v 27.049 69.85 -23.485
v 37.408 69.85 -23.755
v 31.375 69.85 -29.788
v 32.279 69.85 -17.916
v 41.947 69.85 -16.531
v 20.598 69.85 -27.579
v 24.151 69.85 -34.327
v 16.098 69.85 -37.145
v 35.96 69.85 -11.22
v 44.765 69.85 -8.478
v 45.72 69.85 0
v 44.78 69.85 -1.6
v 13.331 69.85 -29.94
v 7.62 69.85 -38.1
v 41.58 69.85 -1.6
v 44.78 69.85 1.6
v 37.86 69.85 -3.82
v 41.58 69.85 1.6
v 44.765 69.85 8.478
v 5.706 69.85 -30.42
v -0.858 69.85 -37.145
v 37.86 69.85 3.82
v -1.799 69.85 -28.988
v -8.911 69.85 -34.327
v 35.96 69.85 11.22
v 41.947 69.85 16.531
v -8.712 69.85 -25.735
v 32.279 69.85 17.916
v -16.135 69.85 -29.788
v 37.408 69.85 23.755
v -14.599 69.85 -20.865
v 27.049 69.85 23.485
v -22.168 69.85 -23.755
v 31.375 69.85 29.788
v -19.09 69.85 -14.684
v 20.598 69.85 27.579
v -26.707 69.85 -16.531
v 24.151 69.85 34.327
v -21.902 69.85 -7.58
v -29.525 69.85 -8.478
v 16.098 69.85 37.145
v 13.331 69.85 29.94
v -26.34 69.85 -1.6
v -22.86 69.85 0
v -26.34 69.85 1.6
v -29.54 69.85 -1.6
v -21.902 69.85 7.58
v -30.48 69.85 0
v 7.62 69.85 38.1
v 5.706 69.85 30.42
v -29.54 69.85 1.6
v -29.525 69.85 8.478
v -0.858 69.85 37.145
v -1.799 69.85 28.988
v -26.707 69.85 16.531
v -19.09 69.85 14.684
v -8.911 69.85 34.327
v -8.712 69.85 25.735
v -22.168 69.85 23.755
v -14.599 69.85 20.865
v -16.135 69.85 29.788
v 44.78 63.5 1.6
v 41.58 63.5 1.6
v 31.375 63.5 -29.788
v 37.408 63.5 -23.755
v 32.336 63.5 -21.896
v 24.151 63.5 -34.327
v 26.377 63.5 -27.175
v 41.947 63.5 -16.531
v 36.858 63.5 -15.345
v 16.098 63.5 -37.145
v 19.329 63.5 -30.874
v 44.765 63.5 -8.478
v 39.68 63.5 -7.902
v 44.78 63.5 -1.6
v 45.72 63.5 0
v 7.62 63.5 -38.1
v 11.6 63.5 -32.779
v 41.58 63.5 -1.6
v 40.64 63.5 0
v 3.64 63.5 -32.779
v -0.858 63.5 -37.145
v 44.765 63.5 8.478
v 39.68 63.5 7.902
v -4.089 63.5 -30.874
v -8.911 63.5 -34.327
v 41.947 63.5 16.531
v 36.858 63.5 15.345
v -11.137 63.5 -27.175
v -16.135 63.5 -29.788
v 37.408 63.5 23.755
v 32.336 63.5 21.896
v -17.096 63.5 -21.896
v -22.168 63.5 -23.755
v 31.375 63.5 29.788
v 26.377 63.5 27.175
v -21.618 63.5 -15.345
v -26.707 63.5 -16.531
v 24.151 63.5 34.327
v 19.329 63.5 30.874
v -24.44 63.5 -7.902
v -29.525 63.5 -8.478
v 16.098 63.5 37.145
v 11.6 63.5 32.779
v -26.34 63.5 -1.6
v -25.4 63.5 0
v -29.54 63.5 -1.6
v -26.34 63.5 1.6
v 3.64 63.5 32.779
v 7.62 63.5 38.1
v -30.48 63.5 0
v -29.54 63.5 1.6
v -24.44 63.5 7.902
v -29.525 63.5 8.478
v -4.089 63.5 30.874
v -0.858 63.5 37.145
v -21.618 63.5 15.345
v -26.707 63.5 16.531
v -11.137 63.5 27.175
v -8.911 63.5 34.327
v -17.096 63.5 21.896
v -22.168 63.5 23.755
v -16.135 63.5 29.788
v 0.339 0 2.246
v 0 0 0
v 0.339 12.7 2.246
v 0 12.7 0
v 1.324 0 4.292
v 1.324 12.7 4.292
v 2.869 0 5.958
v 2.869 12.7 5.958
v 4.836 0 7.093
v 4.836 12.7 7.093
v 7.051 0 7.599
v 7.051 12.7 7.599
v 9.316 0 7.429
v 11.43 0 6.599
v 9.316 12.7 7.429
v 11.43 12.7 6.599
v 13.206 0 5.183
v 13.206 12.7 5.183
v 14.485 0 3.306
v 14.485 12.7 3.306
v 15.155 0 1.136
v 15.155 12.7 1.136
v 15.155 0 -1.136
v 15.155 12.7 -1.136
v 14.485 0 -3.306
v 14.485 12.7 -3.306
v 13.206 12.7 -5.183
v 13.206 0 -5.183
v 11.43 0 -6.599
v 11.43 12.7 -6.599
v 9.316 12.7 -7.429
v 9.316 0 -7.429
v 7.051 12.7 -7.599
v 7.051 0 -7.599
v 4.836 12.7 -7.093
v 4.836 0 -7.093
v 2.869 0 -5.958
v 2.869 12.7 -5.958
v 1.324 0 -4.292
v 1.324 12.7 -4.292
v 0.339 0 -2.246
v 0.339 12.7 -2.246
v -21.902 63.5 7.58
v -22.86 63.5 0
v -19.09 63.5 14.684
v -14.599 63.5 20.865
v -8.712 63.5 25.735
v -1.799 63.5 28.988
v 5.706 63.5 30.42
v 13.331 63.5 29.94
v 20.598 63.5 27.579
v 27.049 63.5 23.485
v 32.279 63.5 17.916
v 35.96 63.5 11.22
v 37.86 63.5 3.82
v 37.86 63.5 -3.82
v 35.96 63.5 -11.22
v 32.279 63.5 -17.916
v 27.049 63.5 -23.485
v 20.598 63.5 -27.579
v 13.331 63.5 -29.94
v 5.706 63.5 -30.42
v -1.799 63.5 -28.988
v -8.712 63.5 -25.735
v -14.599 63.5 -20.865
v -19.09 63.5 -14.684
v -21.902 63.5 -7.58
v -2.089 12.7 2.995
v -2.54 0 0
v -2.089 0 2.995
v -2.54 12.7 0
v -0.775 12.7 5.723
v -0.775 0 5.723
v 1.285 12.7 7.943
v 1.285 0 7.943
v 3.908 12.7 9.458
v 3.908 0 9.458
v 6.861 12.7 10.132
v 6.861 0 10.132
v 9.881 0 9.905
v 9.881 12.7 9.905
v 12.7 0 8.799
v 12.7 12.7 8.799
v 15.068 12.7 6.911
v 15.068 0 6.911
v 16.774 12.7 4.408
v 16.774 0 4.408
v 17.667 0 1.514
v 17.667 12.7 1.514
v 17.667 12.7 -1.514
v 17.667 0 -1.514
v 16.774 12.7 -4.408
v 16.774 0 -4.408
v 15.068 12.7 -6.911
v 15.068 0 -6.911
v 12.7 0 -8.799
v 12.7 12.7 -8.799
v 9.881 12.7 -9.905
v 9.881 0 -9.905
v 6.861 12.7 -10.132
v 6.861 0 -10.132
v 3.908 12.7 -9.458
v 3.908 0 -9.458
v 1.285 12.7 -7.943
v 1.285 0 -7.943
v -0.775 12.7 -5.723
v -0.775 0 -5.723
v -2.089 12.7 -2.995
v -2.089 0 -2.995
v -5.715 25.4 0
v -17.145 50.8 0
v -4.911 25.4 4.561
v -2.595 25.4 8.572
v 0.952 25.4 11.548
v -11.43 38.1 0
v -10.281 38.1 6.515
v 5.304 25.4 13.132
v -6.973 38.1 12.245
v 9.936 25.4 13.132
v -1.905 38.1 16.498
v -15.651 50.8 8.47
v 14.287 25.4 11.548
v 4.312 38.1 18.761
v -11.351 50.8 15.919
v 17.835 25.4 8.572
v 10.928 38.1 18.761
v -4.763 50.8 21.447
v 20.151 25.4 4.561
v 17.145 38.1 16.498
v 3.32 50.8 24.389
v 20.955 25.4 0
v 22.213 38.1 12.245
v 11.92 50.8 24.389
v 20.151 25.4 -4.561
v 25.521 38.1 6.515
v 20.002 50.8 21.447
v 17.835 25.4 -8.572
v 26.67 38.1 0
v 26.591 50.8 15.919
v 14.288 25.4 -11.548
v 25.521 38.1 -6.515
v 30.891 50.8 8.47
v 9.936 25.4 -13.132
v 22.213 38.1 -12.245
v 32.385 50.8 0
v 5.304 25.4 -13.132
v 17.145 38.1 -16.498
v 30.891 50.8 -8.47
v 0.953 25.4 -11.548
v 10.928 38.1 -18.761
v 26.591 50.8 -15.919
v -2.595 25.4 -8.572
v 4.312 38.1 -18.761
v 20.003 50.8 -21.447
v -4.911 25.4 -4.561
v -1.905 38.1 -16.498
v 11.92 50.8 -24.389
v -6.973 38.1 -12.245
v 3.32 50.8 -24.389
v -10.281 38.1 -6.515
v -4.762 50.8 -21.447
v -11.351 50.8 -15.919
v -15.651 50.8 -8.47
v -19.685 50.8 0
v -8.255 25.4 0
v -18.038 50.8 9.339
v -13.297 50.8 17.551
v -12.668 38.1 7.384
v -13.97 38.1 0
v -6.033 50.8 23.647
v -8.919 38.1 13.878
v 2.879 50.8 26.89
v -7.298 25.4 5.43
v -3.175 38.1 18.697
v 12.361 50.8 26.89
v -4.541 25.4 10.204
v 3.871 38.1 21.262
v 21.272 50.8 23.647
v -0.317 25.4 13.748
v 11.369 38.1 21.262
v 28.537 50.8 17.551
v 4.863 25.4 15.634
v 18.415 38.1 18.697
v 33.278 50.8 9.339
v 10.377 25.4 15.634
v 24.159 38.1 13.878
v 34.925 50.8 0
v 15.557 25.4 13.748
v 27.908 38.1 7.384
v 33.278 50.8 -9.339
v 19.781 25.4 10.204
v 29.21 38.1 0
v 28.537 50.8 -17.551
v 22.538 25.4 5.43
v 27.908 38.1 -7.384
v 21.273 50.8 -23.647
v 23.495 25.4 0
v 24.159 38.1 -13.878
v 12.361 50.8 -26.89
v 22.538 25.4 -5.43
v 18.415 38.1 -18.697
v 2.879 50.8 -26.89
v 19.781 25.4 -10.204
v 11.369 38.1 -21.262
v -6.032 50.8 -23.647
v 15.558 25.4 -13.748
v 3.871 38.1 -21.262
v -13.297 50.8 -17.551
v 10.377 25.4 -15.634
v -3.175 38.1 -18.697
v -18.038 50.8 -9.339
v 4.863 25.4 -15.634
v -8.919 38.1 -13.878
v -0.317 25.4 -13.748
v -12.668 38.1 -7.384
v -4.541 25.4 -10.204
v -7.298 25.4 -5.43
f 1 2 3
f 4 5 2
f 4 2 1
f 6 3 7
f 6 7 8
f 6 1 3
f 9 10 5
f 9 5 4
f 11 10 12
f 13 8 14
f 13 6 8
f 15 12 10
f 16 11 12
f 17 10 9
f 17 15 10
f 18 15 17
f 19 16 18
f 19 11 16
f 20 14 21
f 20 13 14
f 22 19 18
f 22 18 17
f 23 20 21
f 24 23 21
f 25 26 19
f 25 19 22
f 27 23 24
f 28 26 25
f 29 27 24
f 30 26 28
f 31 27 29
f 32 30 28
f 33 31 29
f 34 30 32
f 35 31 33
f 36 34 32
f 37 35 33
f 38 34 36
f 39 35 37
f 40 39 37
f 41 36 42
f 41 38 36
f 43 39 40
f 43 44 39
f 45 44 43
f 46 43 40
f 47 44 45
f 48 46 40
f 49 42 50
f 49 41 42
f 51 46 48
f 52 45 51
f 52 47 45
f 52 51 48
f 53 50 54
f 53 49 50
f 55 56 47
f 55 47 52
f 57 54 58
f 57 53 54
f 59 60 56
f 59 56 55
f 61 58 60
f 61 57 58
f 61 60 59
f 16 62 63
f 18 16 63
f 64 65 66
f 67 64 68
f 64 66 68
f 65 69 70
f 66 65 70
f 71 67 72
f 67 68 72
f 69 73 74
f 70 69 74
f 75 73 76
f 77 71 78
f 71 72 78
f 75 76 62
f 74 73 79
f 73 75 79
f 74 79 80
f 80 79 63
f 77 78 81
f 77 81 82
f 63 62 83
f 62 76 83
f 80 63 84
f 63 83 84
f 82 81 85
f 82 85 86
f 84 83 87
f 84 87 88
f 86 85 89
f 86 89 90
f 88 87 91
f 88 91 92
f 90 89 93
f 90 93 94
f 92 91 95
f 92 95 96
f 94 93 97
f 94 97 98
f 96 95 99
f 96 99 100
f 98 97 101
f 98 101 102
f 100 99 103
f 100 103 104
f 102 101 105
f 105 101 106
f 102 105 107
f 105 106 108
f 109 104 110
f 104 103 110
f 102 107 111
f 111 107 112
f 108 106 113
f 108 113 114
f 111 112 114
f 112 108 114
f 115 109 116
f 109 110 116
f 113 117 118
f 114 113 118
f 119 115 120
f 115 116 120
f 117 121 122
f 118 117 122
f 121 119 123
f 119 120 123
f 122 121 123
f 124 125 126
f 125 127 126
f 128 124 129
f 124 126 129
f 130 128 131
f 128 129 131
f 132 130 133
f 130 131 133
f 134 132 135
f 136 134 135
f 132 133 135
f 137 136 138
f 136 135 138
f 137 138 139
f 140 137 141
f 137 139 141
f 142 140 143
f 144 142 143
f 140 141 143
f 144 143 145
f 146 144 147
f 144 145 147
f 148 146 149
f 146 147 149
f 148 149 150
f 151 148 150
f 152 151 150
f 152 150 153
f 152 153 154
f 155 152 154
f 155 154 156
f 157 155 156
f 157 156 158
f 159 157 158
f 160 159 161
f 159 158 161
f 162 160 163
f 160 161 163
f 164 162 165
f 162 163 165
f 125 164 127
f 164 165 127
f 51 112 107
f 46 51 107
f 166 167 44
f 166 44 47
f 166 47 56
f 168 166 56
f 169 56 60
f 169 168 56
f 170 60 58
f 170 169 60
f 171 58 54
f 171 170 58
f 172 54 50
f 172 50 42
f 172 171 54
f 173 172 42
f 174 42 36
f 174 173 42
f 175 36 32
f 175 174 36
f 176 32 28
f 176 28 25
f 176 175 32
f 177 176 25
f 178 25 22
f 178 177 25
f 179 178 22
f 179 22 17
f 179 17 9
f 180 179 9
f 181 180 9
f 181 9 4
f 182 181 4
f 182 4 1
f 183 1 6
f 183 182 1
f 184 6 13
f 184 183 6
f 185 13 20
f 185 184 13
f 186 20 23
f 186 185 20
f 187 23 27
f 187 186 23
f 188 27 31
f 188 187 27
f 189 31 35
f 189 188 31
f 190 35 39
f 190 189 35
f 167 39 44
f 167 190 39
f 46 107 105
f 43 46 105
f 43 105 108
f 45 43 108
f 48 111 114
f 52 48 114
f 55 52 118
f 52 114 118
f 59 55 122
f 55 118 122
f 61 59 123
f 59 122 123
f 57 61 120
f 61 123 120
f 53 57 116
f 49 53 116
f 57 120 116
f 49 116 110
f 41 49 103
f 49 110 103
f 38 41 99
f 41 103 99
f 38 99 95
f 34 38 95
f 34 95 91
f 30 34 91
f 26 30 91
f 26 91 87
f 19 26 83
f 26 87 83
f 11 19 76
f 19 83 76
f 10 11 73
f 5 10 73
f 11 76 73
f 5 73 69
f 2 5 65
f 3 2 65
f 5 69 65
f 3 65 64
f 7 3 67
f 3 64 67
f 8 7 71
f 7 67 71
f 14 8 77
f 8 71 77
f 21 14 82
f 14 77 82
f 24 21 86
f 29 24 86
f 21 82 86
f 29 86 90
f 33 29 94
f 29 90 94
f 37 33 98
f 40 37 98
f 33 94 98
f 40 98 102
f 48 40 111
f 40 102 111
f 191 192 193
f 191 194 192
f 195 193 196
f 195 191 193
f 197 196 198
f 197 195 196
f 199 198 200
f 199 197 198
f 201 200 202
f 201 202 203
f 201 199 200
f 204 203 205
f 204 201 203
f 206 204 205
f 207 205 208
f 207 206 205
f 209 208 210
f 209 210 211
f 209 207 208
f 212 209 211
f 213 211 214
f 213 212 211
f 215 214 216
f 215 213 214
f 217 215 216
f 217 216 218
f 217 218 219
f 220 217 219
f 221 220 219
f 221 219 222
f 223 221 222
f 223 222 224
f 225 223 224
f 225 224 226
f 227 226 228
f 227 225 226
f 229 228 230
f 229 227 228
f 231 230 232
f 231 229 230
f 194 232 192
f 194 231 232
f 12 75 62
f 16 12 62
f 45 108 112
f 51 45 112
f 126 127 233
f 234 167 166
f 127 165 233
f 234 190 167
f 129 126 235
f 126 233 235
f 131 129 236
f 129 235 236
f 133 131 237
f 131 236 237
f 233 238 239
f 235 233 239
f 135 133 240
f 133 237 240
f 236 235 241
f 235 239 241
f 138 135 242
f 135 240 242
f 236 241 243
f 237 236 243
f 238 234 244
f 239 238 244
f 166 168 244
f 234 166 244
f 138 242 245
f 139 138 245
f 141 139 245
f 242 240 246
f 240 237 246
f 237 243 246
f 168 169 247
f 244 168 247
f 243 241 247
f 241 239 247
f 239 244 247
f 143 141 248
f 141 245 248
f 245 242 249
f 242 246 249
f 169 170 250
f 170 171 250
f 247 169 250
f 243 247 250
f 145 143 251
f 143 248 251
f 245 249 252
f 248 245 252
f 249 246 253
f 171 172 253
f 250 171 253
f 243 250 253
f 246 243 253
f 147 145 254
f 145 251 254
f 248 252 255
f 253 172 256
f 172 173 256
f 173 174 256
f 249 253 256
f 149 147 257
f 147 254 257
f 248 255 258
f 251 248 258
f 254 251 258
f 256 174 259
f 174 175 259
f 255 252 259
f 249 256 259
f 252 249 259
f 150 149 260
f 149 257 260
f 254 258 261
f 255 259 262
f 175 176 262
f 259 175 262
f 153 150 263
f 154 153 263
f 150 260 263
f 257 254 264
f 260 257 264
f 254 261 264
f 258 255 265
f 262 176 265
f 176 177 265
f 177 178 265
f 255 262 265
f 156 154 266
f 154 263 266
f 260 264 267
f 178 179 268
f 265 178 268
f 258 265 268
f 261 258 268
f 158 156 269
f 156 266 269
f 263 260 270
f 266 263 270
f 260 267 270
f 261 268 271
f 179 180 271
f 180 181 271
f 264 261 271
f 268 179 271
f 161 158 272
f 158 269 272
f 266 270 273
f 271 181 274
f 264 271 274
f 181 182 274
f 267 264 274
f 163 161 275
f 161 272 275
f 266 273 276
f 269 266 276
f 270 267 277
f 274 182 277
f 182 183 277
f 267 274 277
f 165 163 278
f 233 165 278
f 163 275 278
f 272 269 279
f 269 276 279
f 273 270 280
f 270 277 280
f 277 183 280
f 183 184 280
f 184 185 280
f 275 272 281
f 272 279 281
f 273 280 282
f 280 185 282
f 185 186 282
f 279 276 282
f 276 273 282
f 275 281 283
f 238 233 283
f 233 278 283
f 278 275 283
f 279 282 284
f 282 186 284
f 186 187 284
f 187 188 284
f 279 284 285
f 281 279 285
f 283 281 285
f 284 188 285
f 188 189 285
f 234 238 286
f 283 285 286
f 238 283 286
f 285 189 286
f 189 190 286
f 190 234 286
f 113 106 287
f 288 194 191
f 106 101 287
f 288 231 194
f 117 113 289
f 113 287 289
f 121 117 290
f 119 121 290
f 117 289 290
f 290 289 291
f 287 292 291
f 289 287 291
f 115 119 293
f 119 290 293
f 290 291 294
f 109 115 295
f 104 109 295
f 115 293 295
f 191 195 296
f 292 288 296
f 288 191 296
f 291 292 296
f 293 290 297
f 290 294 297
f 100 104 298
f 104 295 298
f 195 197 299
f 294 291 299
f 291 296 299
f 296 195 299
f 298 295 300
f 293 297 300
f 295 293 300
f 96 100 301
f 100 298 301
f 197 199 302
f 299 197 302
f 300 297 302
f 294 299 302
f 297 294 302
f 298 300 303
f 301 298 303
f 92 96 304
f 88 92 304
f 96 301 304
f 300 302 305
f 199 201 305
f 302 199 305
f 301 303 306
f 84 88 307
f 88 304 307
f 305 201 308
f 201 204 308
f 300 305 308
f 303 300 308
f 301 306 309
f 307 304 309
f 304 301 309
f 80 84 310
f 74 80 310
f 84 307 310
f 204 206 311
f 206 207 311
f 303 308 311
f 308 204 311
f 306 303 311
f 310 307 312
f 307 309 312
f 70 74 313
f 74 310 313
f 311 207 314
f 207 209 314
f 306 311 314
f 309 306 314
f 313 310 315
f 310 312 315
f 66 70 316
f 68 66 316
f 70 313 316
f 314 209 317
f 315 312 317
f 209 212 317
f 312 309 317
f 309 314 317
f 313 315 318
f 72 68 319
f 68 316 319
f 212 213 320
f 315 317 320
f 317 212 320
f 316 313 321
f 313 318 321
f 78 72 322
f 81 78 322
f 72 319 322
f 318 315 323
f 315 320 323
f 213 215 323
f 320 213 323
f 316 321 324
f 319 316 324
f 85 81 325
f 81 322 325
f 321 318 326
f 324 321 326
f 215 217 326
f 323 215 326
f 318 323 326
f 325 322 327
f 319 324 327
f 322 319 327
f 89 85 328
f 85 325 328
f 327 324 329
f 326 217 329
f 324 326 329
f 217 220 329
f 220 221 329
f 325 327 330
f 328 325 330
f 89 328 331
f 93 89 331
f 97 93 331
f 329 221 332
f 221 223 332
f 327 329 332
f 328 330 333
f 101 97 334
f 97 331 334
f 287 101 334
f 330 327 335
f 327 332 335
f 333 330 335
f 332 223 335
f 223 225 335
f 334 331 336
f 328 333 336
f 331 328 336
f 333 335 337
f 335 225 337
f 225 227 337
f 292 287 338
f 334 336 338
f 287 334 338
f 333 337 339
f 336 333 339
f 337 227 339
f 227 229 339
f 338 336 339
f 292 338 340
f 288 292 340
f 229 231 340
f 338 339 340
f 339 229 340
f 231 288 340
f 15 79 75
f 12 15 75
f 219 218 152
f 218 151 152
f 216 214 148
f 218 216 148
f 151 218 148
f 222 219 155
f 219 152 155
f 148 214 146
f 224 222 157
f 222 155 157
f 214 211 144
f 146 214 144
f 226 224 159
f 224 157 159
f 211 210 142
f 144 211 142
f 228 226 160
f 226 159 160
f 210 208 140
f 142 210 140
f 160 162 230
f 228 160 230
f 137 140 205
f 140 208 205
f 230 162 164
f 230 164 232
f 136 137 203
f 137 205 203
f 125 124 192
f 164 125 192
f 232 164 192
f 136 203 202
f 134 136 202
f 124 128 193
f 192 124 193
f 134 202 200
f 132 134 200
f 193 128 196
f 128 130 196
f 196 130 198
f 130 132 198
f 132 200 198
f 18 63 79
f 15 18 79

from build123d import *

# Parameters (mm, degrees)
F0_W     = 2.54
F0_H     = 12.7
F2_R     = 38.1
F2_R_2   = 33.02
F3_DEPTH = 6.35
F4_R     = 33.02
F4_R_2   = 30.48
F5_DEPTH = 6.35


with BuildPart() as f1:
    # F0 (on Top) → F1 (revolve)
    with BuildSketch(Plane.XY):
        Polygon((-2.54, 12.7), (0, 12.7), (-22.86, 63.5), (-25.4, 63.5), align=None)
        with Locations((-1.27, 6.35)):
            Rectangle(F0_W, F0_H)
    revolve(axis=Axis((7.62, 34.9172540009, 0), (0, 1, 0)))

    # F2 (on face) → F3 (join)
    with BuildSketch(Plane(origin=(0, 63.5, 0), x_dir=(-1, 0, 0), z_dir=(0, 1, 0))):
        with Locations((-7.62, 0)):
            Circle(F2_R)
        Polygon((-41.5798, -1.6002), (-43.18, -1.6002), (-44.7802, -1.6002), (-44.7802, 1.6002), (-43.18, 1.6002), (-41.5798, 1.6002), align=None, mode=Mode.SUBTRACT)
        with Locations((-7.62, 0)):
            Circle(F2_R_2, mode=Mode.SUBTRACT)
        Polygon((27.94, -1.6002), (26.3398, -1.6002), (26.3398, 1.6002), (27.94, 1.6002), (29.5402, 1.6002), (29.5402, -1.6002), align=None, mode=Mode.SUBTRACT)
    extrude(amount=F3_DEPTH)

    # F4 (on face) → F5 (join)
    with BuildSketch(Plane(origin=(0, 63.5, 0), x_dir=(-1, 0, 0), z_dir=(0, 1, 0))):
        with Locations((-7.62, 0)):
            Circle(F4_R)
        with Locations((-7.62, 0)):
            Circle(F4_R_2, mode=Mode.SUBTRACT)
    extrude(amount=F5_DEPTH)


solid = f1.part
